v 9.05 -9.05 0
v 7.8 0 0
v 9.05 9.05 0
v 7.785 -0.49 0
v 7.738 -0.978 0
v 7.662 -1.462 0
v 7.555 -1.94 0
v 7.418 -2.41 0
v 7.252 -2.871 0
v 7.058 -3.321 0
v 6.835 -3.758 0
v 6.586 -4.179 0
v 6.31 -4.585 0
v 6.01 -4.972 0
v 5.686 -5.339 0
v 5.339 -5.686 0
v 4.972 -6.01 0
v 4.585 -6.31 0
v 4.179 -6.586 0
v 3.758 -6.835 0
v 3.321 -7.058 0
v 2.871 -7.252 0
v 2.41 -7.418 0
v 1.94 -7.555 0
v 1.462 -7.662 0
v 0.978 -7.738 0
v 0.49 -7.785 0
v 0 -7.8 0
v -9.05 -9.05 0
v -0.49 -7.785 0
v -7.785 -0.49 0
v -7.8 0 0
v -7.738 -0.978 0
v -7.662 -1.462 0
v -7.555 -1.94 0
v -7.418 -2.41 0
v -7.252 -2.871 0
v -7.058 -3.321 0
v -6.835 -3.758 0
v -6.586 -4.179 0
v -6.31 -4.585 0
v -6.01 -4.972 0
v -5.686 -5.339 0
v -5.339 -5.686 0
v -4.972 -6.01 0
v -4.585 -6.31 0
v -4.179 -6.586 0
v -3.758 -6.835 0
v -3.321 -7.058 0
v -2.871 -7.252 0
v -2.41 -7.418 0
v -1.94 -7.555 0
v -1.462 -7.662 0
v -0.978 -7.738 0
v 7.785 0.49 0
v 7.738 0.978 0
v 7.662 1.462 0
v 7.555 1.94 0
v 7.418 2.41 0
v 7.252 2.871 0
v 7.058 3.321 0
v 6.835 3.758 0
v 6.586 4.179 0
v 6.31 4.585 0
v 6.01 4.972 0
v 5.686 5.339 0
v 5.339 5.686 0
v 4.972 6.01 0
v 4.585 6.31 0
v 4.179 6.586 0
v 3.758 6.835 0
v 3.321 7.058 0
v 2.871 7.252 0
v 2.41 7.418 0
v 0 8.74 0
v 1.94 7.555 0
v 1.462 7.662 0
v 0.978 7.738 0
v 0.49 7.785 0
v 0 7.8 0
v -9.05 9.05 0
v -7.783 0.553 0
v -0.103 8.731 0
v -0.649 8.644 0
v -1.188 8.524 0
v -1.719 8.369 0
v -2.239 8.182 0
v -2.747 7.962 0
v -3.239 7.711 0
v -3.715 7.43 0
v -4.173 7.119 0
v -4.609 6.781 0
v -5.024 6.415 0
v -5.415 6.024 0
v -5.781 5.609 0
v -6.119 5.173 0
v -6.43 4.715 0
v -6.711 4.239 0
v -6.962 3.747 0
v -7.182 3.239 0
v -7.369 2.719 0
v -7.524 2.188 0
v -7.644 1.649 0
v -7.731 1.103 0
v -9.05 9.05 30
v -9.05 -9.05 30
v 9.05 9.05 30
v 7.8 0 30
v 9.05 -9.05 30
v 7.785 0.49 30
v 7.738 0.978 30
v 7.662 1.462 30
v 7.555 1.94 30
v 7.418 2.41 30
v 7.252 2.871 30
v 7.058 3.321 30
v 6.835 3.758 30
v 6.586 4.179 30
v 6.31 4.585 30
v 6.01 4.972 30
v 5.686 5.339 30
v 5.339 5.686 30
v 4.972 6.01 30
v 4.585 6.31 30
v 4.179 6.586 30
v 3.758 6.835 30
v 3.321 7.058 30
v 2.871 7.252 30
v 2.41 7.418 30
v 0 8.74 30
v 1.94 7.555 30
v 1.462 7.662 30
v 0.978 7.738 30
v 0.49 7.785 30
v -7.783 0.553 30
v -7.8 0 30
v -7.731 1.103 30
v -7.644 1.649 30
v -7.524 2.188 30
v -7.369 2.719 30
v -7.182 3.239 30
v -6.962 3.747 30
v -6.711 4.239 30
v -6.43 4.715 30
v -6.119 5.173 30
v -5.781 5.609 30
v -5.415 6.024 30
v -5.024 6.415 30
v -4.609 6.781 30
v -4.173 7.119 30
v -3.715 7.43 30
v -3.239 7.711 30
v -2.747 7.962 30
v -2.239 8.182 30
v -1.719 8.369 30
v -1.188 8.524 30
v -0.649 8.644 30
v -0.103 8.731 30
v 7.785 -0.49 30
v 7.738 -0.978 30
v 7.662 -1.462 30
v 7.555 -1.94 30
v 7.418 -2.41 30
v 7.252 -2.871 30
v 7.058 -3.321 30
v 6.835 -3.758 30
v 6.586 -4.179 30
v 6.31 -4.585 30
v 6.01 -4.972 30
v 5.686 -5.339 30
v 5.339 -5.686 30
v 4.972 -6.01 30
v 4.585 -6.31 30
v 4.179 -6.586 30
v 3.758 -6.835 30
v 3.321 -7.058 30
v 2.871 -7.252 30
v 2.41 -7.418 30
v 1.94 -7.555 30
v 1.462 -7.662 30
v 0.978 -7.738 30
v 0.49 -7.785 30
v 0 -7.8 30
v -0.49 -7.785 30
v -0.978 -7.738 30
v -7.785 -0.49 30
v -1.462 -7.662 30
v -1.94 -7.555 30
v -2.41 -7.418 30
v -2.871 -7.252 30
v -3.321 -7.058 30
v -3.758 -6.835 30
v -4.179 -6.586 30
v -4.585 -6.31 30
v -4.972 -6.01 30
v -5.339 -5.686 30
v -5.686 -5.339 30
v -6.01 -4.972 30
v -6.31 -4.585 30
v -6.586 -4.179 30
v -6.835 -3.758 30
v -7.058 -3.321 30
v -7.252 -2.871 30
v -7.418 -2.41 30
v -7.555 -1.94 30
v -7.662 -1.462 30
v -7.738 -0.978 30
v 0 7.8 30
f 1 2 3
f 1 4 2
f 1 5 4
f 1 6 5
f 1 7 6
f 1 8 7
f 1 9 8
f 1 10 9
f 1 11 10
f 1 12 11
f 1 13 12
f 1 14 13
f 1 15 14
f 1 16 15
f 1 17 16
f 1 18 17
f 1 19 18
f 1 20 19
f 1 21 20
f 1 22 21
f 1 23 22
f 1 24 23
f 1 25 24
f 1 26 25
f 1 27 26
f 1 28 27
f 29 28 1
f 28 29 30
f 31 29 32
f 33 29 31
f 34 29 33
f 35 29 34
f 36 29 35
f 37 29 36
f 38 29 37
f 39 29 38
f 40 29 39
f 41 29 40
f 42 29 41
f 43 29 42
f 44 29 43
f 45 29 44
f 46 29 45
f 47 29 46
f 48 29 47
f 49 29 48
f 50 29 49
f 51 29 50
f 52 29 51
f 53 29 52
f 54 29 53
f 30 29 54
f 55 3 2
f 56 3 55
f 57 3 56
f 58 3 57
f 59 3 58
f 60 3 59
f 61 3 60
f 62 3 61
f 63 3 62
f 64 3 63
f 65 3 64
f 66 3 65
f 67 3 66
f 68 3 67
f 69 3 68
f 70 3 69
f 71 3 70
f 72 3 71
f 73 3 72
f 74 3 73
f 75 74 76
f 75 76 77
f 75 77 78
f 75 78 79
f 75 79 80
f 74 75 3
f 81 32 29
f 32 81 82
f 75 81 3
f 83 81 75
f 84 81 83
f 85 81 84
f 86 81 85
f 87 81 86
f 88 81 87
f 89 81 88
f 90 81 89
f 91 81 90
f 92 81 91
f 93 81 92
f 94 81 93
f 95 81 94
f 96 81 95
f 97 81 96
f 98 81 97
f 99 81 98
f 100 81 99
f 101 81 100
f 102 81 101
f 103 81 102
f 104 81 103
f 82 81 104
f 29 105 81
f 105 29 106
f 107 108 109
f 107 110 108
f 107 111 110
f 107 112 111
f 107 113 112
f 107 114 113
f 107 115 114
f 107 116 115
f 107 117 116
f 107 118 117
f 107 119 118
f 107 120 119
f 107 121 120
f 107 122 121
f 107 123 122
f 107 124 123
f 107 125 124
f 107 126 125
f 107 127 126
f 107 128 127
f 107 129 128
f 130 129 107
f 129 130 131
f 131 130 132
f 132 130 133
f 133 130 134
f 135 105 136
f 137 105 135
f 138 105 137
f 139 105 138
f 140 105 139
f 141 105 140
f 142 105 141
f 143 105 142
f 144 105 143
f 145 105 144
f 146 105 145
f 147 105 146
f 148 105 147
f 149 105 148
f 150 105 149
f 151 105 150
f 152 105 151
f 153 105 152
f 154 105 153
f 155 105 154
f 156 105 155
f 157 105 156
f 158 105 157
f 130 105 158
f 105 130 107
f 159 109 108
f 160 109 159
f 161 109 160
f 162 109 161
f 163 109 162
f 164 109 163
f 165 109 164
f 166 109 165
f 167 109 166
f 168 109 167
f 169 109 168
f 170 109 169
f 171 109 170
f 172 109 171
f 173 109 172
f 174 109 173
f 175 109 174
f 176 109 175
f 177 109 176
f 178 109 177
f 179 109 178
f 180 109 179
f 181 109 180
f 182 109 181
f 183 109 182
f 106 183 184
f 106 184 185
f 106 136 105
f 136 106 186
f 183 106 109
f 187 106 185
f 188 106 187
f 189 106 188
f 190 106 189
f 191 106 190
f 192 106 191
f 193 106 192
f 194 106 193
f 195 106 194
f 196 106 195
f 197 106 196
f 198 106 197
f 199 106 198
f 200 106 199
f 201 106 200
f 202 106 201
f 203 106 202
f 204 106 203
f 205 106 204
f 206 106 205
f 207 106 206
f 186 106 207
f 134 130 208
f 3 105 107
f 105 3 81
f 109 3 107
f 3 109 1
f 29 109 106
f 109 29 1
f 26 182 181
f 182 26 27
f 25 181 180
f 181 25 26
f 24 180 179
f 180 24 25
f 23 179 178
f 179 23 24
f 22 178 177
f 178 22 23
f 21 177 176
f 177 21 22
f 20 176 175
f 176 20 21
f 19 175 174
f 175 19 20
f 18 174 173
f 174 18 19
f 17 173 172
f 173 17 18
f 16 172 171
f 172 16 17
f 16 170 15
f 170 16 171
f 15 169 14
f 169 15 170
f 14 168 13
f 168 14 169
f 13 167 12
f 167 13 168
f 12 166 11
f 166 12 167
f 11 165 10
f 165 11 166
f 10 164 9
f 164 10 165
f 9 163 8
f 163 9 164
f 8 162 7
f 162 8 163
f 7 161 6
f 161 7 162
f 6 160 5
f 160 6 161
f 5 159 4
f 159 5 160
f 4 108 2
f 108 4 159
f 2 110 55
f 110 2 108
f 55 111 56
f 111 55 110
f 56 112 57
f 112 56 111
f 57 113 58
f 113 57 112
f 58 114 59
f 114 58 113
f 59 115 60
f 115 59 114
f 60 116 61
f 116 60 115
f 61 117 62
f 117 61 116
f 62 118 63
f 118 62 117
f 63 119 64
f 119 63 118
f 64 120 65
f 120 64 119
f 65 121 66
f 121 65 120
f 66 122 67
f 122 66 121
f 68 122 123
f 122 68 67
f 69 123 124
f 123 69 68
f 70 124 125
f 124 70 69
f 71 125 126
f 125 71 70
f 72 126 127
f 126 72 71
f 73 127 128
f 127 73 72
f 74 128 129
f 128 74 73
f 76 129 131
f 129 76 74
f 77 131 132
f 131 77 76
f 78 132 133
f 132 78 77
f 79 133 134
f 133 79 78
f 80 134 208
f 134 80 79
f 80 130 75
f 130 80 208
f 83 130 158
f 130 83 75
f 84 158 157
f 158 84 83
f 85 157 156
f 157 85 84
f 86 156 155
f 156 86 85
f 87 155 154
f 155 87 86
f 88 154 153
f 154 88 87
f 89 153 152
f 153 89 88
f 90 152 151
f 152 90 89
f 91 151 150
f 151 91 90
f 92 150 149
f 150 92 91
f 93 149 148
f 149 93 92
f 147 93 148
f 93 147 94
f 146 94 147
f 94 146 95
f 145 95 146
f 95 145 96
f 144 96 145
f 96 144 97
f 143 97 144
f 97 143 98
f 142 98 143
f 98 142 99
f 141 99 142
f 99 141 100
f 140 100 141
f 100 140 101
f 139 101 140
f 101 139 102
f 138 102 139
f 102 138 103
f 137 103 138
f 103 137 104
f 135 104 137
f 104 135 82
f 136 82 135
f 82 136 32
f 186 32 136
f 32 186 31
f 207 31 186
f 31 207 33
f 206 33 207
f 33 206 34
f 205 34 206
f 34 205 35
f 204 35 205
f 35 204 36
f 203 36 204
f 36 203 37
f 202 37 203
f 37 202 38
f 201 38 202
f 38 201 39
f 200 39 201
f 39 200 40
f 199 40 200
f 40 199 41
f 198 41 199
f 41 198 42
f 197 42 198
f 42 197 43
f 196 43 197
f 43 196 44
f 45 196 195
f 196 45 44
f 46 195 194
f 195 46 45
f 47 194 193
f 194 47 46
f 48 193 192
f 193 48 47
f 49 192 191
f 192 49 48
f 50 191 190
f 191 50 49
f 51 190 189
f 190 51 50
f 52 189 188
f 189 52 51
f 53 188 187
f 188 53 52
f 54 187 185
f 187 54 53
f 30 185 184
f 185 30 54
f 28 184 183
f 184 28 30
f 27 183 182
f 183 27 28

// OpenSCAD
$fn = 100;
tol = 0.5;
lower_diameter = 14.6;
upper_diameter = 16.6;
lower_radius = (lower_diameter / 2) + tol;
upper_radius = (upper_diameter / 2) + tol;
height = 30;
exterior = 1.5;

circle_offset = (upper_radius - lower_radius);

difference()
{
    linear_extrude(height = height) square(upper_diameter + exterior, center = true);
    linear_extrude(height = height) union()
    {
        translate([ 0, 0, 0 ]) circle(lower_radius);
        difference()
        {
            translate([ circle_offset, 0, 0 ]) circle(upper_radius);
            translate([ 0, -upper_radius, 0 ]) square([ upper_radius * 2, upper_radius * 2 ]);
            translate([ -upper_radius, -upper_radius, 0 ]) square([ upper_radius * 2, upper_radius ]);
        }
    }
}

// color("green") translate([ circle_offset + tol, 0, 0 ]) circle(upper_radius);
// color("blue") translate([ circle_offset, 0, 0 ]) circle(upper_radius);
